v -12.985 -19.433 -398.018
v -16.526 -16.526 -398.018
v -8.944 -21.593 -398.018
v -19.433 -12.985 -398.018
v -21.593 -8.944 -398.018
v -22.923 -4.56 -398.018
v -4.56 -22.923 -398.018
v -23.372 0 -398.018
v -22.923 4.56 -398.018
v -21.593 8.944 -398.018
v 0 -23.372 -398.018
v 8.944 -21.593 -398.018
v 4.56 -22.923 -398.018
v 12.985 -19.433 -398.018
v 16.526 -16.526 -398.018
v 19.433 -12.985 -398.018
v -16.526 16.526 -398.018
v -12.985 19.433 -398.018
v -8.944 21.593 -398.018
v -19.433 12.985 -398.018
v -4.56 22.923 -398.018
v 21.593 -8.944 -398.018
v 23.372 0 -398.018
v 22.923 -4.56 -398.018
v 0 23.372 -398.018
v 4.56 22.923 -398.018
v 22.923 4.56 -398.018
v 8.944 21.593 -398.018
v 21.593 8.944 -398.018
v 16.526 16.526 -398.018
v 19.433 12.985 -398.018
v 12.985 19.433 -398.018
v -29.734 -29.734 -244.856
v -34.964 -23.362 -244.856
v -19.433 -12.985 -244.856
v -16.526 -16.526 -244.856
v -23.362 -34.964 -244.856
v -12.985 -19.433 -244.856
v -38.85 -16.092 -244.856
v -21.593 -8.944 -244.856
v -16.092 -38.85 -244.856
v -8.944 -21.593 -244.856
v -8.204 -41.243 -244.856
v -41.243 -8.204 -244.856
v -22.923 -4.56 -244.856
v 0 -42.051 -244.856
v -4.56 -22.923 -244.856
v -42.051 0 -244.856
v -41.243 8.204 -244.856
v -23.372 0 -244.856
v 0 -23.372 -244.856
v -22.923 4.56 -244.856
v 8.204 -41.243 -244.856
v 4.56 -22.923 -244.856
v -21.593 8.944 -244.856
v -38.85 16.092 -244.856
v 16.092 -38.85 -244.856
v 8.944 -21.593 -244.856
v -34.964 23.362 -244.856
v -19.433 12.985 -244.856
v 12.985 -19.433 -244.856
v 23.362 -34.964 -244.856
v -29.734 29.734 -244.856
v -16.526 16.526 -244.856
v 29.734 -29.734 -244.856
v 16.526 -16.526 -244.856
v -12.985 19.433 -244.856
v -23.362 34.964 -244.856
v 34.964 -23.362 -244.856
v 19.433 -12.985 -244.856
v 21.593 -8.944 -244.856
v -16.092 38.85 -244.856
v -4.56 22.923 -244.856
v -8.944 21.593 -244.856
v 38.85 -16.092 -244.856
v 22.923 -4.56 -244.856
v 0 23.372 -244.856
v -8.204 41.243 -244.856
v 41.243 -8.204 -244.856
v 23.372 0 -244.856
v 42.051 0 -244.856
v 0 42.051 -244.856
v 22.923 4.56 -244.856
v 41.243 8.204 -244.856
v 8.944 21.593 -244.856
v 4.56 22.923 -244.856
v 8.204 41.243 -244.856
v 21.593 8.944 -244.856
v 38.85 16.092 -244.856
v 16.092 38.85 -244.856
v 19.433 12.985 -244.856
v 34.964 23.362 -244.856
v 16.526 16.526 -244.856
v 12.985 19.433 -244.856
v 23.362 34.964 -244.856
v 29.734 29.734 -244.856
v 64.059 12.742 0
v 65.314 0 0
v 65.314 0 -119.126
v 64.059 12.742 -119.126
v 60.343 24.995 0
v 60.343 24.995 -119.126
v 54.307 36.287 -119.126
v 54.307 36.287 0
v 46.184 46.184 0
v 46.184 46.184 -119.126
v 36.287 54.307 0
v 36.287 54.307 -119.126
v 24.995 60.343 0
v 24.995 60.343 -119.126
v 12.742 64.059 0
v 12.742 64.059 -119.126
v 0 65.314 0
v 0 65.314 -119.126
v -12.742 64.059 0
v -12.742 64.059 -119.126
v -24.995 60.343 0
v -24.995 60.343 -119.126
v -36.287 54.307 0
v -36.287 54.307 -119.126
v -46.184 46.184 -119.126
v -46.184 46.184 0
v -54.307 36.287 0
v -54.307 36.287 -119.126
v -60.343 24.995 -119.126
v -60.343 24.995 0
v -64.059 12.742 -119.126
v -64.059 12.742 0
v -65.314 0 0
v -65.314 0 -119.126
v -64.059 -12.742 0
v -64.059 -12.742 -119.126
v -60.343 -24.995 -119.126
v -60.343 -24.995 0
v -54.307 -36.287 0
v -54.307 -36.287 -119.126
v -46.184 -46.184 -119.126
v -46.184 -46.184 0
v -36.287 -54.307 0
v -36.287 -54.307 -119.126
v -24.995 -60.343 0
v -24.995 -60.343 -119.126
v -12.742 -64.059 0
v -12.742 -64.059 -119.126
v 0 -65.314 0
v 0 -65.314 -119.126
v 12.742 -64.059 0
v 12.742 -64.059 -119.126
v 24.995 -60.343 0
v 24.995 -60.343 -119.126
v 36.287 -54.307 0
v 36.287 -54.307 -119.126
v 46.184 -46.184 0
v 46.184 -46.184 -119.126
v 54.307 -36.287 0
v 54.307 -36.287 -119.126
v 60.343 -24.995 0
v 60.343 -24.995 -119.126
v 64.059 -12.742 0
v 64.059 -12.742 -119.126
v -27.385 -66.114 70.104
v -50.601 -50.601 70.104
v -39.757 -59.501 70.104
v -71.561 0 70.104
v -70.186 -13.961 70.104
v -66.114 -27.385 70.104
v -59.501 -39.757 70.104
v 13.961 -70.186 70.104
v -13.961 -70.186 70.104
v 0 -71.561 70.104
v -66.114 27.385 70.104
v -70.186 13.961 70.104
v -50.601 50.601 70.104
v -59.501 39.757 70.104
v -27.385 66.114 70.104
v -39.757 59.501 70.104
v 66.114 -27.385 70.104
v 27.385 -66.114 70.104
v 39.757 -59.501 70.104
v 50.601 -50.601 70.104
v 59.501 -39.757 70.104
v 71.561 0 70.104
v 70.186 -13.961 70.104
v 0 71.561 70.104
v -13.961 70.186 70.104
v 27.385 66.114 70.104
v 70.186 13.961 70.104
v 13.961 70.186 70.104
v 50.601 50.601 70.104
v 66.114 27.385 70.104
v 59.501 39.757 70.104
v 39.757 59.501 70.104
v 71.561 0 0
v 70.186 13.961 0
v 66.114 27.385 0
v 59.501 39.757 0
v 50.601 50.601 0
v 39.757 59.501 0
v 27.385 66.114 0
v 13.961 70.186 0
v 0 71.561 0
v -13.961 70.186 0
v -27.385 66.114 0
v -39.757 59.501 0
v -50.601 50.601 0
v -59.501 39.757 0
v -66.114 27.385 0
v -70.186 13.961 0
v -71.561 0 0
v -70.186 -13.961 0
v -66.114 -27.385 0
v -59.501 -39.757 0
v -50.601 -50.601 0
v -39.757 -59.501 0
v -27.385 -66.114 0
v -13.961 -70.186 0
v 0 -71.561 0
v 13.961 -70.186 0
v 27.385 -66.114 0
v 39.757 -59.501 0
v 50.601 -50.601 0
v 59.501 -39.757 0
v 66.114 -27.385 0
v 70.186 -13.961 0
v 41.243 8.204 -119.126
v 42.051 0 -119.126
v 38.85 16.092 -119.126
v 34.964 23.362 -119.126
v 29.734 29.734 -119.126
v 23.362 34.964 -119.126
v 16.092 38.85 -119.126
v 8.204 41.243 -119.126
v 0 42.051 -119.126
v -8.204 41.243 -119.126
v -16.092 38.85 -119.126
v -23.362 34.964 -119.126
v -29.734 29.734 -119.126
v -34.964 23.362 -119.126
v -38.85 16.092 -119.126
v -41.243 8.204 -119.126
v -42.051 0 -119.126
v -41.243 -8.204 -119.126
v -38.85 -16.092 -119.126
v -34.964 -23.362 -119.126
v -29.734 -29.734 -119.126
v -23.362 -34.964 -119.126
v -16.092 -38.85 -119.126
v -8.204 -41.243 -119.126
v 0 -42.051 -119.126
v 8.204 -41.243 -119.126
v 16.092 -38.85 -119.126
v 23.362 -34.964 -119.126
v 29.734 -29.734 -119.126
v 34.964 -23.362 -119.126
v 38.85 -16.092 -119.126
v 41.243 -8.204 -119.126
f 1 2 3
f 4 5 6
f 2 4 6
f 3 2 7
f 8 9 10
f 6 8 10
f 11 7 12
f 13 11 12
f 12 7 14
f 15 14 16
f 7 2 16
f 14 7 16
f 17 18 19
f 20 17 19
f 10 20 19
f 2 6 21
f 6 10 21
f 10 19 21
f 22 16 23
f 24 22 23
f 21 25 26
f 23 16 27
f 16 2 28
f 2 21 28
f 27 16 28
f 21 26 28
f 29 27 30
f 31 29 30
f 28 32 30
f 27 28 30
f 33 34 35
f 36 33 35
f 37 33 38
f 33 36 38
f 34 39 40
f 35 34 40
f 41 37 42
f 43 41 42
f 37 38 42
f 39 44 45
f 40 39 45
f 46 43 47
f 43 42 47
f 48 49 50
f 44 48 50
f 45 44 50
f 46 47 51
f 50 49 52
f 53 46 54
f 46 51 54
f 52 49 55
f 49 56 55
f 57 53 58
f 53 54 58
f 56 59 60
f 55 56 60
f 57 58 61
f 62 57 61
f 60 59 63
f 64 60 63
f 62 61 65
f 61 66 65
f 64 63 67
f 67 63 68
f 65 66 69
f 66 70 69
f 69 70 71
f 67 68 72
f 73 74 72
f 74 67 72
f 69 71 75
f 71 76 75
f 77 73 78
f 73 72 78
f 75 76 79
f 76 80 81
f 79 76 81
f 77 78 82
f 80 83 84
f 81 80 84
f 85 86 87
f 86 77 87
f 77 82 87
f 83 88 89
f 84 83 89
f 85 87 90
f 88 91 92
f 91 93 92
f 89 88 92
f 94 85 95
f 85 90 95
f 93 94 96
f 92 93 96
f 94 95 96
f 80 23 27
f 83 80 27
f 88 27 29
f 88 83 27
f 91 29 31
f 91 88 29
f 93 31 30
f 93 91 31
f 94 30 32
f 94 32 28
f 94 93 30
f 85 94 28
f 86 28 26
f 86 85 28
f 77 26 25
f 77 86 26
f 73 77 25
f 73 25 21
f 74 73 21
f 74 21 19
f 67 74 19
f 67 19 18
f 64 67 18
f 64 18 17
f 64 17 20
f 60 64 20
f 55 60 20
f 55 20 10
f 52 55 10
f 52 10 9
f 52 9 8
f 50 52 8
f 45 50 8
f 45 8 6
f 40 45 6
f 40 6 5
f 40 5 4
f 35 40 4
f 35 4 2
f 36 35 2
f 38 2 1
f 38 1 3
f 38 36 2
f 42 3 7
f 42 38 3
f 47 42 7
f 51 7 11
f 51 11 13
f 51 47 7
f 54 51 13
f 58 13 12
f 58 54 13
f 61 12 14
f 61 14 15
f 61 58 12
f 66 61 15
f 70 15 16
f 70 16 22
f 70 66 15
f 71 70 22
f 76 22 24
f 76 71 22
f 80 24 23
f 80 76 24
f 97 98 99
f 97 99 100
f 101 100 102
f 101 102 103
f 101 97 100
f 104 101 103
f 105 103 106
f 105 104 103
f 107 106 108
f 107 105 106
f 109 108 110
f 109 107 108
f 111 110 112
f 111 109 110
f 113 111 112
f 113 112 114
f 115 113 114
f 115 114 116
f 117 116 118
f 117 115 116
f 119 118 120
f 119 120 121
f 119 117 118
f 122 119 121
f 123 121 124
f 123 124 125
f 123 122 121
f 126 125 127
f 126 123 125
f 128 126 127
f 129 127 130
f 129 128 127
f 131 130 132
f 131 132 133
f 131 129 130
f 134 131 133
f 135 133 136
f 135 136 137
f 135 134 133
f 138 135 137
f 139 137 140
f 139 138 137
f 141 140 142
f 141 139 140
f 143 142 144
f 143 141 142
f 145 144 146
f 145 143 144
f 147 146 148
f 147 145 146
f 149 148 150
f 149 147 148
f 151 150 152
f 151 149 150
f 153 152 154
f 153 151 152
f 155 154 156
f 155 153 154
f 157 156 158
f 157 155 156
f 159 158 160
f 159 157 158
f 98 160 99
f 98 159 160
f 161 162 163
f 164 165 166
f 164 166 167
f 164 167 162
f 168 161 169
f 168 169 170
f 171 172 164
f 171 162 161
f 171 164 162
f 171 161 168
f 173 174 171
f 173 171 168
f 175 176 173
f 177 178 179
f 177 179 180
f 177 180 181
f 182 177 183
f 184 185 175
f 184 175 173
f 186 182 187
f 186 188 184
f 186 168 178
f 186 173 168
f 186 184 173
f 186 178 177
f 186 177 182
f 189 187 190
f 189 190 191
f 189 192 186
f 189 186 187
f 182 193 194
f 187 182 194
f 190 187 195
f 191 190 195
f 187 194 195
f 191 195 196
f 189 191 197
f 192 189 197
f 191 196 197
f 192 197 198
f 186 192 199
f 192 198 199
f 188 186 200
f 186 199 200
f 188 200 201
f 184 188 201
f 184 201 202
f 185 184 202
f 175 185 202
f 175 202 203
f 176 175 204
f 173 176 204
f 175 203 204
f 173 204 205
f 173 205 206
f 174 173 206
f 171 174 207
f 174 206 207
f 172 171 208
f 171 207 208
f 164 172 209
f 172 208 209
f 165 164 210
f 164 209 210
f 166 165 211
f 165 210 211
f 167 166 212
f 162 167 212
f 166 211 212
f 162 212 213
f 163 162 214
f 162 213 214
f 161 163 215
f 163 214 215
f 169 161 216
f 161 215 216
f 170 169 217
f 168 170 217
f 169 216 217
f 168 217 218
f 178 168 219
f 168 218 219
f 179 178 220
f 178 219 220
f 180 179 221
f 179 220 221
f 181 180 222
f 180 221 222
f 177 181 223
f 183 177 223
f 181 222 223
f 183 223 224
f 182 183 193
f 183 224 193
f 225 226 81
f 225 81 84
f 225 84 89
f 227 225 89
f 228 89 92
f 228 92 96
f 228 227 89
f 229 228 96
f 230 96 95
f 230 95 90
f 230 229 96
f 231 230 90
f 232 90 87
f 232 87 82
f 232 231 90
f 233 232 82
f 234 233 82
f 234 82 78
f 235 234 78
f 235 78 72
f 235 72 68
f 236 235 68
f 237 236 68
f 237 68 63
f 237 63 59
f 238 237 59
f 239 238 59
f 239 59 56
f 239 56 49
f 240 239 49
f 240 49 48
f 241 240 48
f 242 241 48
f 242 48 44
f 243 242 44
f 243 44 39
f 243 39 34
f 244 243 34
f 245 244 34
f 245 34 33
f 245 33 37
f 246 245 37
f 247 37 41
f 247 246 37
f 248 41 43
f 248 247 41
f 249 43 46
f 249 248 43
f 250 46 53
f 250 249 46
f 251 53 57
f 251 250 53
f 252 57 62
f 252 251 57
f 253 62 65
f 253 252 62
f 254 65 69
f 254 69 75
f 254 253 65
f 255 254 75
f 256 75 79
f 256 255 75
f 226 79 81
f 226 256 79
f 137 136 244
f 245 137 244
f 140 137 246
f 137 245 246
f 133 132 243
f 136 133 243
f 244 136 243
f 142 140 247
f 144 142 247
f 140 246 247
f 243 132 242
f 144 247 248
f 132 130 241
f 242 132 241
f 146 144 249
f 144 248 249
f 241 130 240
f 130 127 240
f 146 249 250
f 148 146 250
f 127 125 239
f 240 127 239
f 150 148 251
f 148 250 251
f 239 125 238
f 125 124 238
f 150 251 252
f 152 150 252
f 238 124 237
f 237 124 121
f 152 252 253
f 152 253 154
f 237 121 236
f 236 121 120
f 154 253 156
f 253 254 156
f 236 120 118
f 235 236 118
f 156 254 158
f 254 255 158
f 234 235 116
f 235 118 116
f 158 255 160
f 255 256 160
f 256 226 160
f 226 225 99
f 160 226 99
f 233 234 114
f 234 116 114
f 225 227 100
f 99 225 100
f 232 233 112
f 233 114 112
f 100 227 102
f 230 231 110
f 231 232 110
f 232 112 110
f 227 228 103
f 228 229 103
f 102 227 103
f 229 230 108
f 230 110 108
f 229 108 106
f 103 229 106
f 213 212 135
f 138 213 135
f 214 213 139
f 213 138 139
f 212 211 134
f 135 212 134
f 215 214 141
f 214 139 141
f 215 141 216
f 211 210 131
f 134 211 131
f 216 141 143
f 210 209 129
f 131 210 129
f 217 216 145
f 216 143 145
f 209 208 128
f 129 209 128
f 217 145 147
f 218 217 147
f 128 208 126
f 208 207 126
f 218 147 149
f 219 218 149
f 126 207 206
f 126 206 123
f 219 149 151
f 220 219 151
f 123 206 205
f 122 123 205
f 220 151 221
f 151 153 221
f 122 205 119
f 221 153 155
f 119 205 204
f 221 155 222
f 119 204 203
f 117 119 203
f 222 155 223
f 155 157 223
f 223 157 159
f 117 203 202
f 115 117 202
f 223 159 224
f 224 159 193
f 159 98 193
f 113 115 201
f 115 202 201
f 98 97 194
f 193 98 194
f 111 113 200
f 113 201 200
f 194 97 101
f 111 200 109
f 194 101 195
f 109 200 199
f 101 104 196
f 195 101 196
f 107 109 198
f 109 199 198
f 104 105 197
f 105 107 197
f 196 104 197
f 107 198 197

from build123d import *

# Parameters (mm, degrees)
F0_R          = 71.561005
F1_DEPTH      = 70.104
F2_R          = 65.314313
F3_DEPTH      = 62.23
F3_DEPTH_BACK = 119.126
F4_R          = 42.050536
F5_DEPTH      = 25.4
F5_DEPTH_BACK = 244.856
F6_R          = 23.371581
F7_DEPTH      = 25.4
F7_DEPTH_BACK = 398.018


with BuildPart() as f1:
    # F0 (on Top) → F1 (new body)
    with BuildSketch(Plane.XY):
        Circle(F0_R)
    extrude(amount=F1_DEPTH)

    # F2 (on Top) → F3 (join, two sides)
    with BuildSketch(Plane.XY) as f3_sk:
        Circle(F2_R)
    extrude(amount=F3_DEPTH)
    extrude(f3_sk.sketch, amount=-F3_DEPTH_BACK)

    # F4 (on Top) → F5 (join, two sides)
    with BuildSketch(Plane.XY) as f5_sk:
        Circle(F4_R)
    extrude(amount=F5_DEPTH)
    extrude(f5_sk.sketch, amount=-F5_DEPTH_BACK)

    # F6 (on Top) → F7 (join, two sides)
    with BuildSketch(Plane.XY) as f7_sk:
        Circle(F6_R)
    extrude(amount=F7_DEPTH)
    extrude(f7_sk.sketch, amount=-F7_DEPTH_BACK)


solid = f1.part
